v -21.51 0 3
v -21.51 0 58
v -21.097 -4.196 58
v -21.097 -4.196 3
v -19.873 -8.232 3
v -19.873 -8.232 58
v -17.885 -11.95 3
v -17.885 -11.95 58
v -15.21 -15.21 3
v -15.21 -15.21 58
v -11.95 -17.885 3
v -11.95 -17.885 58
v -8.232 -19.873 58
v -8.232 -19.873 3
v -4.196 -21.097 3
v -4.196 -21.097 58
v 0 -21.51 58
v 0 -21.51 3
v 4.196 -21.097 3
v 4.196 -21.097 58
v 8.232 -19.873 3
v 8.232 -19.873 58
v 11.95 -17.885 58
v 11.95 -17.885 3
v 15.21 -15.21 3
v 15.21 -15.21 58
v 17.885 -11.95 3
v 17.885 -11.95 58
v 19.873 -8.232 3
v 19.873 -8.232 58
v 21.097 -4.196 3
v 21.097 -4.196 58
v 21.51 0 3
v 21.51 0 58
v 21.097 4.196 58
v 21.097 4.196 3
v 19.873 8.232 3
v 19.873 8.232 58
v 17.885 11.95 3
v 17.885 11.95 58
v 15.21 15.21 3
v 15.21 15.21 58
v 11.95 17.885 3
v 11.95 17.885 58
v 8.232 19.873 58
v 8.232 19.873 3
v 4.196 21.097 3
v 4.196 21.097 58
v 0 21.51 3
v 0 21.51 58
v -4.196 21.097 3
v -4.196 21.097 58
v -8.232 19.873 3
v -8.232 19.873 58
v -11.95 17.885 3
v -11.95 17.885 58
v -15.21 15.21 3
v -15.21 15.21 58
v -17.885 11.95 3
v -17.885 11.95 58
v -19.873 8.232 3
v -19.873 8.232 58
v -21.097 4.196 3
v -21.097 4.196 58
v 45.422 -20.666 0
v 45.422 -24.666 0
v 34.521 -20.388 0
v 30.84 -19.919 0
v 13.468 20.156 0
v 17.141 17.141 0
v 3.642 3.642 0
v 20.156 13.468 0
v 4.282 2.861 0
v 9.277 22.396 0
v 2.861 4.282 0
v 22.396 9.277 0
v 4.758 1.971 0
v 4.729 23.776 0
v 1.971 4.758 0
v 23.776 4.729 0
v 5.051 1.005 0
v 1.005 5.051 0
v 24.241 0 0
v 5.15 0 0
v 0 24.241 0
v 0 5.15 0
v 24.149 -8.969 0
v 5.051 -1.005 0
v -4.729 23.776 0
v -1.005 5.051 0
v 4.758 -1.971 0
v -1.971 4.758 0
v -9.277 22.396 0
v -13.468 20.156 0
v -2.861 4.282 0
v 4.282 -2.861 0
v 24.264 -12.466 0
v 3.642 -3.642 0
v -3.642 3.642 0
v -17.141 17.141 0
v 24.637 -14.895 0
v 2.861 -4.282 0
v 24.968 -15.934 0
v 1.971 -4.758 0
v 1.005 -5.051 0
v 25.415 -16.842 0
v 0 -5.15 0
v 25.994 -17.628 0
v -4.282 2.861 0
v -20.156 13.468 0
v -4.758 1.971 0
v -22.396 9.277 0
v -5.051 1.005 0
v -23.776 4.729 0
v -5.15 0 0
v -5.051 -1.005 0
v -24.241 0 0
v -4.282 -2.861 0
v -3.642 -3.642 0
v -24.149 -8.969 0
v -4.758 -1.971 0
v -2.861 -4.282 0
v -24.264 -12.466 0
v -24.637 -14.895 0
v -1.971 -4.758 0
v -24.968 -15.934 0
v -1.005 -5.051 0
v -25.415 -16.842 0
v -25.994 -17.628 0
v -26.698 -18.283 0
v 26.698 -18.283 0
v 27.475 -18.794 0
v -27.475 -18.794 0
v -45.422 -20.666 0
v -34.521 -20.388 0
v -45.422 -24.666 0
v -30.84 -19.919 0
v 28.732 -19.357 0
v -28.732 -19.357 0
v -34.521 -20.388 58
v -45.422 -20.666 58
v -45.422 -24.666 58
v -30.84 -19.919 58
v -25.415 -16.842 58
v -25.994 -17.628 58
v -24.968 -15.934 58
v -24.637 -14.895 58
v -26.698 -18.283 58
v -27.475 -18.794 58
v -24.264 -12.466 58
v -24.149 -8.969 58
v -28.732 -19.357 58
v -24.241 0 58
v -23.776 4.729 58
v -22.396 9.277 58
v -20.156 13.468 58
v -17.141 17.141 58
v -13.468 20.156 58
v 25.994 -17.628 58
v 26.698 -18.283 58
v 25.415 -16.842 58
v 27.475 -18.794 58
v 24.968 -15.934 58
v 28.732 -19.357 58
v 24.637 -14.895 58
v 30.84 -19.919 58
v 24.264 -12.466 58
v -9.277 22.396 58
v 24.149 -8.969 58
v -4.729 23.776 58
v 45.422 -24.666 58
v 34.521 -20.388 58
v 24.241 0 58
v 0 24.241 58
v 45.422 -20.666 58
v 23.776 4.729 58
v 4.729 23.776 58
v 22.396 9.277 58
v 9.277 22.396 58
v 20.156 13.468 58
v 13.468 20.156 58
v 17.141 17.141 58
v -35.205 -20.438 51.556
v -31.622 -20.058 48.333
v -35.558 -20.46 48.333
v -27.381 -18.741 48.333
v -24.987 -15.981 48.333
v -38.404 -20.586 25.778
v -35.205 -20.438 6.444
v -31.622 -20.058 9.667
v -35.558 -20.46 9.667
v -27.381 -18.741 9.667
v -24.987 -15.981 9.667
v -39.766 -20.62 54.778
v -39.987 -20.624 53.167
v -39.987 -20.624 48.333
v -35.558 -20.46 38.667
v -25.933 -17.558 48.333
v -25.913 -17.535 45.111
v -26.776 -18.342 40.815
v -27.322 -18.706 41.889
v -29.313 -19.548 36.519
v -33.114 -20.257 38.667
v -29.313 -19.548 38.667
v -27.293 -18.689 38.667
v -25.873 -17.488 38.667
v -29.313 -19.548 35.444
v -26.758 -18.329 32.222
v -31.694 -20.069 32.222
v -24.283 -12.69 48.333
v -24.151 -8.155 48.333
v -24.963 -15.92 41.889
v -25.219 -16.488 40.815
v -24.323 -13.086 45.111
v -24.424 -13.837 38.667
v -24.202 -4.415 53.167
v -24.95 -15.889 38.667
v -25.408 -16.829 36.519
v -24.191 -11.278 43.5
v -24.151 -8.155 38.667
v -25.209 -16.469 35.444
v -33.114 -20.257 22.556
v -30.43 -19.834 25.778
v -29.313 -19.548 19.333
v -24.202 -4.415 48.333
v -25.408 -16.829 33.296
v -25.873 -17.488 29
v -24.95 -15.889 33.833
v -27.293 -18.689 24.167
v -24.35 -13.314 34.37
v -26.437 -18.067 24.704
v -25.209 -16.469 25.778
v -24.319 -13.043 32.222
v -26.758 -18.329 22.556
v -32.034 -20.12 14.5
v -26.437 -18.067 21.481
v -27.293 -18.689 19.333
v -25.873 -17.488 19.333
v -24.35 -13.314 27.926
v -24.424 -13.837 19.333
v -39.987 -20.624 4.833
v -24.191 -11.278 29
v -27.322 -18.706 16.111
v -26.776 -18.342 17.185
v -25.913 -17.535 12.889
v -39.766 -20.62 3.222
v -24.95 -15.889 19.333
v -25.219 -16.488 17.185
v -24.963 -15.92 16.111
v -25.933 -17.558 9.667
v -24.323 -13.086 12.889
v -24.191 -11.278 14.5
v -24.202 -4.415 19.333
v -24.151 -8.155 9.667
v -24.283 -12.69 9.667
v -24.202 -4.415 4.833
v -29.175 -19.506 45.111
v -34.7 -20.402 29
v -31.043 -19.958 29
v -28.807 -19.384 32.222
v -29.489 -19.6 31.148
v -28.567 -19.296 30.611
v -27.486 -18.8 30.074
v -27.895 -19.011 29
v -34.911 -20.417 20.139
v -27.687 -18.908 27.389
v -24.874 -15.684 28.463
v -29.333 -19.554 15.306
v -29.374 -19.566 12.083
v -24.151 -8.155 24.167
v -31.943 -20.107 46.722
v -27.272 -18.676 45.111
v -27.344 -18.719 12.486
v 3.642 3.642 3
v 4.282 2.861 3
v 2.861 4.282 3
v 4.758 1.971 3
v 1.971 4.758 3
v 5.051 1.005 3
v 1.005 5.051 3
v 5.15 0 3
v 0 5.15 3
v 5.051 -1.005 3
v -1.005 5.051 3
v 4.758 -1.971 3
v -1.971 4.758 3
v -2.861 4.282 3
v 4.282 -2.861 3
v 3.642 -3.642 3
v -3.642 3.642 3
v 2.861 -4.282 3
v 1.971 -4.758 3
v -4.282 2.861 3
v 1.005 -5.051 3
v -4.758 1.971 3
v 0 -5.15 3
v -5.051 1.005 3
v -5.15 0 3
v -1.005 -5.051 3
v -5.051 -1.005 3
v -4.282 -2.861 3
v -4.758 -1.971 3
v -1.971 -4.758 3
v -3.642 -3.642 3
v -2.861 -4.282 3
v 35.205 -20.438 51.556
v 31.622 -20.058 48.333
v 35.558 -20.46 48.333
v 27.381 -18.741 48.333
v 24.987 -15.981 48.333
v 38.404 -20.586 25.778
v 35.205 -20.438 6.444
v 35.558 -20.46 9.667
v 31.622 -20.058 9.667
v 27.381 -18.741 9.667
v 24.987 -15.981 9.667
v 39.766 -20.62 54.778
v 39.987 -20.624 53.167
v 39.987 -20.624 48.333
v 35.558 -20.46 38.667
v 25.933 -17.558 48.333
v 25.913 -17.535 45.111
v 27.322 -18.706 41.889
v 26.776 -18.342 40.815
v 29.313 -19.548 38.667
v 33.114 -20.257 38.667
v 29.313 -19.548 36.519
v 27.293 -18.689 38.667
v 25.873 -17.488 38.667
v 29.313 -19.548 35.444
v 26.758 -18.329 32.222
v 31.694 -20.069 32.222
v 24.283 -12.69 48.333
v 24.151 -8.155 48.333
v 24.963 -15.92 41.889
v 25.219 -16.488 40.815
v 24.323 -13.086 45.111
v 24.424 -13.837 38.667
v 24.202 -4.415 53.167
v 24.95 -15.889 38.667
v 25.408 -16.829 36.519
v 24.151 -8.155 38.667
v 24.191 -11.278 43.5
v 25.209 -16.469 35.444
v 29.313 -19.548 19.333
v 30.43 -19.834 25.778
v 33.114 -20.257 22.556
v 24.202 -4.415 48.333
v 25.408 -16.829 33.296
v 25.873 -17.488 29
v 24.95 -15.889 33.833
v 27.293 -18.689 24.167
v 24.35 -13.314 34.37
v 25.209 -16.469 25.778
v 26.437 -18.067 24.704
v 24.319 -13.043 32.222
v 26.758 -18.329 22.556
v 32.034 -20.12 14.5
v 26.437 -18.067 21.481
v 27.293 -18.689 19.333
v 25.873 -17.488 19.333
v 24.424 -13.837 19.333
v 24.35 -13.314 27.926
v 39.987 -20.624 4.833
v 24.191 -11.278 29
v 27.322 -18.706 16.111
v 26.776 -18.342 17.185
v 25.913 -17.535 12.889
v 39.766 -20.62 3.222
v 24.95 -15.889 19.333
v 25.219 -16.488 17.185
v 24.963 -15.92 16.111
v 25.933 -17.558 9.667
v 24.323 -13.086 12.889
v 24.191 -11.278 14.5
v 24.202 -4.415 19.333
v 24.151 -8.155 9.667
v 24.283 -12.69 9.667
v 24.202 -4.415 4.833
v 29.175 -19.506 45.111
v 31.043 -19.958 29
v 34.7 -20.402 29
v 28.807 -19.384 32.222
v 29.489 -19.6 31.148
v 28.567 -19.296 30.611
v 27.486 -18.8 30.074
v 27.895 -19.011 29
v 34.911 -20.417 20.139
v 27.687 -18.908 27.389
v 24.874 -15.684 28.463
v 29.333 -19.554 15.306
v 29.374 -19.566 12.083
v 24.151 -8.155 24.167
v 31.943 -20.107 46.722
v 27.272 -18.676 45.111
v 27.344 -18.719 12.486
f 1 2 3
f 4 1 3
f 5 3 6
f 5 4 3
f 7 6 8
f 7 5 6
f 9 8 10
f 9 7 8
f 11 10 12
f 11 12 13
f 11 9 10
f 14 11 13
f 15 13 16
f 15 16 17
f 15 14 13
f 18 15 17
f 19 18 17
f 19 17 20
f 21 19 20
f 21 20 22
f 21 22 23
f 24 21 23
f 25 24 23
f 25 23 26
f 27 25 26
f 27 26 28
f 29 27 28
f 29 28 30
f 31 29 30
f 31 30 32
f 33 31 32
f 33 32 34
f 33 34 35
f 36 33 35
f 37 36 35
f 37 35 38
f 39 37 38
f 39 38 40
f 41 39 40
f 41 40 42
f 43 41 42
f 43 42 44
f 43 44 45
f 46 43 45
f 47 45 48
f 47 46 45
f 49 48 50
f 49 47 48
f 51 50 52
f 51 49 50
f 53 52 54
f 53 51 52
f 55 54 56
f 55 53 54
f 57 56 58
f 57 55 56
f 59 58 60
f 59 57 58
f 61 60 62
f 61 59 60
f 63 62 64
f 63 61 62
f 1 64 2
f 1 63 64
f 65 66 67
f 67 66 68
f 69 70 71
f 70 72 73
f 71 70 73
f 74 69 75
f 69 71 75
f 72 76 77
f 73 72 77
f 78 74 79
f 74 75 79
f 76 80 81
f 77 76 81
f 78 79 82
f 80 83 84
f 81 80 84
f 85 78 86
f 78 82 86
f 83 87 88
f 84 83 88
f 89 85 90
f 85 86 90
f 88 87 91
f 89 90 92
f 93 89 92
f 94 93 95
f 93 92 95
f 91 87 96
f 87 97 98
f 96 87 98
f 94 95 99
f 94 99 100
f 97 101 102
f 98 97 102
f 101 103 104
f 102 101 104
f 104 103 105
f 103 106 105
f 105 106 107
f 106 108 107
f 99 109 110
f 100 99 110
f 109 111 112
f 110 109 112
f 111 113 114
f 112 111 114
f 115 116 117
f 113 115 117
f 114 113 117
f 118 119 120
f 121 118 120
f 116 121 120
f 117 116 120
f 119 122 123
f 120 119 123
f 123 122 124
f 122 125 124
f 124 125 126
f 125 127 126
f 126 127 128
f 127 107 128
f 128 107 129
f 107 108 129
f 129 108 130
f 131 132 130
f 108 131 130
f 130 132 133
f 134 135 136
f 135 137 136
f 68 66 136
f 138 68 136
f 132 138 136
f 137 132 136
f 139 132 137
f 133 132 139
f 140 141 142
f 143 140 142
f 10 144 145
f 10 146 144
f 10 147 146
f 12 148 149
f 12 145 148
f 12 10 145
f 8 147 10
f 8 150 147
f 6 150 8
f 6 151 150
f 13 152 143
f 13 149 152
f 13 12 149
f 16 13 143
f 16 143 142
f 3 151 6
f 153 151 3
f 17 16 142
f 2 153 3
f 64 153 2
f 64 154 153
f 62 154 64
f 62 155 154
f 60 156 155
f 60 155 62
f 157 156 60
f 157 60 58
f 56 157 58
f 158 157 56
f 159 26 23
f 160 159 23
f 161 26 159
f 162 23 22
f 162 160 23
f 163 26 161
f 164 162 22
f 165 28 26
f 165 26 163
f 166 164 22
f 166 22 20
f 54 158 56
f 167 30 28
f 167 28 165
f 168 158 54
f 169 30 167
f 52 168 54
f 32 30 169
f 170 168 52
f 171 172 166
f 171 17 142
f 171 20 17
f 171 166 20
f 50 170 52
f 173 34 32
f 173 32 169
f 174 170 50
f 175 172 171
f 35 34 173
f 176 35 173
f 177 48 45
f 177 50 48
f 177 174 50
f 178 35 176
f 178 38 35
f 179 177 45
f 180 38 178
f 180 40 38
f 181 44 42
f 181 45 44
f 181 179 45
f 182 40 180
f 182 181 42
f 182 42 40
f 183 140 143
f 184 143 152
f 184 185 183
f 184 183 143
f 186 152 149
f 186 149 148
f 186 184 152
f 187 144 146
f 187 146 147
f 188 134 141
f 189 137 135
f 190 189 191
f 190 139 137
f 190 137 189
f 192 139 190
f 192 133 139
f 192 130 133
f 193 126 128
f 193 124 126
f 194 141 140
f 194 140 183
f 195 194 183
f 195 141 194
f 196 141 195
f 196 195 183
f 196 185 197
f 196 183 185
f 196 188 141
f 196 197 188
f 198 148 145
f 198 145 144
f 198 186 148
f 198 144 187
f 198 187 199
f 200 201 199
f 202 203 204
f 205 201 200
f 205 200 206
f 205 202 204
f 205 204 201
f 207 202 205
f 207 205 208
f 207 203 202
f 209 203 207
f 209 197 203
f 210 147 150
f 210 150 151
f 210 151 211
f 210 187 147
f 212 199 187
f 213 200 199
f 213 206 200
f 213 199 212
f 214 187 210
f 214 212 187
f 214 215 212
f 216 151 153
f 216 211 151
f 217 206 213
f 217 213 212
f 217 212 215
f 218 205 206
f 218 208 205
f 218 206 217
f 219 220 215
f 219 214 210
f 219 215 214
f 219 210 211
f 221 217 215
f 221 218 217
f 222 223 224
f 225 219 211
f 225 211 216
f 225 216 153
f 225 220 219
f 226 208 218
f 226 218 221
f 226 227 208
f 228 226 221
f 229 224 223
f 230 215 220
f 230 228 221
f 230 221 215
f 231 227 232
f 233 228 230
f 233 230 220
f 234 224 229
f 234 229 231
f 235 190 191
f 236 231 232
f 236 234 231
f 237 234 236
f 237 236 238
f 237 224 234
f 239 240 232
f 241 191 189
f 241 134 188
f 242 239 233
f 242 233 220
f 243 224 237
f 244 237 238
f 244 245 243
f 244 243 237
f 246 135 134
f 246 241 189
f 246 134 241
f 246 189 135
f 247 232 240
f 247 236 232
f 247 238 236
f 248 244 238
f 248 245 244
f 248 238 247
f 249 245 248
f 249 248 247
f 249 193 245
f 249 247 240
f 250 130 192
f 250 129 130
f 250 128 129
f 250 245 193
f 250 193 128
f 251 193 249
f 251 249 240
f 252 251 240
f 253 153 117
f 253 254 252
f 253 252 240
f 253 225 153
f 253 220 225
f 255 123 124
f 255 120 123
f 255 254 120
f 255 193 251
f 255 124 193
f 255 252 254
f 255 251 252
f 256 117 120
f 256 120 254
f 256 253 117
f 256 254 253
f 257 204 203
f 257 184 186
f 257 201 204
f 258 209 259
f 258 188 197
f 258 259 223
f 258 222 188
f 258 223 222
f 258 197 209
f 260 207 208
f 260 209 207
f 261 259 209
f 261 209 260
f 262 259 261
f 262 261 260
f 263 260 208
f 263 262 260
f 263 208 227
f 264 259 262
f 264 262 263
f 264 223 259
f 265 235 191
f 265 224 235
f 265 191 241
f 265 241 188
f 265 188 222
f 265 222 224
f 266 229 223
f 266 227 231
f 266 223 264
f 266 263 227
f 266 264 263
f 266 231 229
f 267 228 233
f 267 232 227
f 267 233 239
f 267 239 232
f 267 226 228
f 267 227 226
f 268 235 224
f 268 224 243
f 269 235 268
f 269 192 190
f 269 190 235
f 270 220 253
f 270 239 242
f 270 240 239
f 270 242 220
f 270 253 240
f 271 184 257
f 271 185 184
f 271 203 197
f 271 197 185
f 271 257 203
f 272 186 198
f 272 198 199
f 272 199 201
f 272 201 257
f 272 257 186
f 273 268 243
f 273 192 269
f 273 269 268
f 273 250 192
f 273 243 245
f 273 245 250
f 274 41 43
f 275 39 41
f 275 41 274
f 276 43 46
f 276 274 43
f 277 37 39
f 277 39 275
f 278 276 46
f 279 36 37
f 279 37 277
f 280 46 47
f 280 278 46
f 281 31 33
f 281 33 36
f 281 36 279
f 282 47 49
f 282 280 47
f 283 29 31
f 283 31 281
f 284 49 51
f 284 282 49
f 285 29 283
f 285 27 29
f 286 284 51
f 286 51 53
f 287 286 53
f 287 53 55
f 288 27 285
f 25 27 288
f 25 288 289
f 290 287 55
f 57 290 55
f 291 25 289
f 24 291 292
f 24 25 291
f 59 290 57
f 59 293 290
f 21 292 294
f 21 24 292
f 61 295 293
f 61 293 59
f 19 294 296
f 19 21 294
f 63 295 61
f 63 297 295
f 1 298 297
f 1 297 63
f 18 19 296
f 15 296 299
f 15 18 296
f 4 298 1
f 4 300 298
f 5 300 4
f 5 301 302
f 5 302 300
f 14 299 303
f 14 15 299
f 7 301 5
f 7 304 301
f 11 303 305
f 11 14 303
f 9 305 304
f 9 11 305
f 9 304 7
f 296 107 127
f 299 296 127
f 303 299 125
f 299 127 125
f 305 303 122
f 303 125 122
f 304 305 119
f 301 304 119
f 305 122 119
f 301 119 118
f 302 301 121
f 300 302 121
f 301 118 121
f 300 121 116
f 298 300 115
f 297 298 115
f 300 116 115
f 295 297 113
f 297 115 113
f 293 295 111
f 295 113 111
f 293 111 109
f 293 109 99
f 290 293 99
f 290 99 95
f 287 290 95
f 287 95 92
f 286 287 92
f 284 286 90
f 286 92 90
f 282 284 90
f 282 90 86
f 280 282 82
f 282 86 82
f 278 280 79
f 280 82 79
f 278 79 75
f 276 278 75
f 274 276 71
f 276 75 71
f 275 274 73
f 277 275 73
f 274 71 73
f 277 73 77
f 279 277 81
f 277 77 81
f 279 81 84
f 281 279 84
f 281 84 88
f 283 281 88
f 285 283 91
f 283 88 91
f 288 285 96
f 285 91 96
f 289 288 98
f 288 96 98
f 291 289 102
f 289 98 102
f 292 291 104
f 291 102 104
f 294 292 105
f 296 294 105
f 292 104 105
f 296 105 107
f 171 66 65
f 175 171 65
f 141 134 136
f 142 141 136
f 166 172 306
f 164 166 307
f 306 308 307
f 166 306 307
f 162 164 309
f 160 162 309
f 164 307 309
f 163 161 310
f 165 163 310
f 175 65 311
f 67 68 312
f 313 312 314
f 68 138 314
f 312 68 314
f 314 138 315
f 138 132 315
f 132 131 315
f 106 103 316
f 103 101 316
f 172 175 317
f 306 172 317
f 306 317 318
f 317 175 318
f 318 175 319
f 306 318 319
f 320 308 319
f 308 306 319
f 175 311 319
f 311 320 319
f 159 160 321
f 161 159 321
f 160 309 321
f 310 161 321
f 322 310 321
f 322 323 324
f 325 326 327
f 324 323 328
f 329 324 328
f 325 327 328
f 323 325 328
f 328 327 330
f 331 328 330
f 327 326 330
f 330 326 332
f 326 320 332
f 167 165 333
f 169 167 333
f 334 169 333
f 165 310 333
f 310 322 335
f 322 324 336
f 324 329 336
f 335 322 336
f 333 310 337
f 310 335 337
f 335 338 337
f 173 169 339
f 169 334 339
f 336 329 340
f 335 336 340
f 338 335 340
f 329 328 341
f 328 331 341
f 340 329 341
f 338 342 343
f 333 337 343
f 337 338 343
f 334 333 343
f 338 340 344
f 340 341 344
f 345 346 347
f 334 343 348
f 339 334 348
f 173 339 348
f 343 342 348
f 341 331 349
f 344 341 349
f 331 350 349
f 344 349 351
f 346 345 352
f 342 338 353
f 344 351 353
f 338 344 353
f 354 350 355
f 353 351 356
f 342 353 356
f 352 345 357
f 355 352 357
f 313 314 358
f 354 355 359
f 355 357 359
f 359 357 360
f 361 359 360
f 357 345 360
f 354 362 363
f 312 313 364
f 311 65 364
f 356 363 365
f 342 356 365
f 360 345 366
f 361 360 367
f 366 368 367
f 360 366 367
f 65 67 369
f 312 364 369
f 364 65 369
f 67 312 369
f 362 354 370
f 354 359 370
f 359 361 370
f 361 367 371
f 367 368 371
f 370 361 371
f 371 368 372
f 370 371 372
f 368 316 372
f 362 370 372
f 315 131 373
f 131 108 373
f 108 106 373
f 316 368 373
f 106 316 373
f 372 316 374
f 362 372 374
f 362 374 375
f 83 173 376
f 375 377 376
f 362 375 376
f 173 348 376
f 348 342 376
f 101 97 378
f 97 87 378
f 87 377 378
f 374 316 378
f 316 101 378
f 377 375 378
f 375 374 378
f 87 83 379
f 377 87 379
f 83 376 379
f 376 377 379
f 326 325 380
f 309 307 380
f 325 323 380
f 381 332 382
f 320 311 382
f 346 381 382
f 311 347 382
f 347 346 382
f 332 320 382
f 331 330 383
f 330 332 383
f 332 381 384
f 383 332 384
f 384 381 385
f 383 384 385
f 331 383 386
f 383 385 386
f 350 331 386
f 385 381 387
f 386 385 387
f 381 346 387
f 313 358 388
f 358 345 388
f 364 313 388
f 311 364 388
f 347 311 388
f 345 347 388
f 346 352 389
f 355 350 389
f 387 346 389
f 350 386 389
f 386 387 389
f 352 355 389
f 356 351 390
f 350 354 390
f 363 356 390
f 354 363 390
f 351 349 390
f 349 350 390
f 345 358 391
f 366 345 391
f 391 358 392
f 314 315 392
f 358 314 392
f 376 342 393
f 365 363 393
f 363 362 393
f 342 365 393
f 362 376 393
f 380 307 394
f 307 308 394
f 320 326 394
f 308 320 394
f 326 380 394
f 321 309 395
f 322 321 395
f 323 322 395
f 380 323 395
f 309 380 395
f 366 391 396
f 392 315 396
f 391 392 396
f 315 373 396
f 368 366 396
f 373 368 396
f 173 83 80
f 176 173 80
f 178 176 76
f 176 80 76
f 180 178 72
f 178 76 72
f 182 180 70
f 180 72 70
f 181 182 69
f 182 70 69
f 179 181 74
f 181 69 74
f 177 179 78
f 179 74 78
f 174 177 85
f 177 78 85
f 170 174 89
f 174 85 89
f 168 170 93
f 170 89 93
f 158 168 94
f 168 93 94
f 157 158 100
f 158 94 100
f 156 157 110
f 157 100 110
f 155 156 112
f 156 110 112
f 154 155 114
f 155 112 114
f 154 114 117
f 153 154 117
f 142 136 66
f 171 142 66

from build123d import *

# Parameters (mm, degrees)
SKETCH1_R           = 21.51
BOSS_EXTRUDE1_DEPTH = 58
SKETCH1_4_R         = 21.51
BOSS_EXTRUDE2_DEPTH = 3


with BuildPart() as part:
    # Sketch1 → Boss-Extrude1 (new body)
    with BuildSketch(Plane.XY):
        with BuildLine():
            Line((-45.421940828, -20.666245921), (-45.421940828, -24.666245921))
            Line((-45.421940828, -24.666245921), (45.421940828, -24.666245921))
            Line((45.421940828, -24.666245921), (45.421940828, -20.666245921))
            add(Edge.make_bspline(
                [(45.421940828, -20.666245921), (21.532203305, -20.666245921), (24.241475666, -19.078845964), (24.241475666, 0)],
                knots=[0, 0, 0, 0, 1, 1, 1, 1], degree=3))
            ThreePointArc((24.241475666, 0), (0, 24.241475666), (-24.241475666, 0))
            add(Edge.make_bspline(
                [(-45.421940828, -20.666245921), (-21.532203305, -20.666245921), (-24.241475666, -19.078845964), (-24.241475666, 0)],
                knots=[0, 0, 0, 0, 1, 1, 1, 1], degree=3))
        make_face()
        Circle(SKETCH1_R, mode=Mode.SUBTRACT)
    extrude(amount=BOSS_EXTRUDE1_DEPTH)

    # Sketch1<4> → Boss-Extrude2 (add)
    with BuildSketch(Plane.XY):
        Circle(SKETCH1_4_R)
        with BuildLine():
            ThreePointArc((0, -5.15), (-3.641599923, 3.641599923), (5.15, 0))
            ThreePointArc((5.15, 0), (3.641599923, -3.641599923), (0, -5.15))
        make_face(mode=Mode.SUBTRACT)
    extrude(amount=BOSS_EXTRUDE2_DEPTH)


solid = part.part
